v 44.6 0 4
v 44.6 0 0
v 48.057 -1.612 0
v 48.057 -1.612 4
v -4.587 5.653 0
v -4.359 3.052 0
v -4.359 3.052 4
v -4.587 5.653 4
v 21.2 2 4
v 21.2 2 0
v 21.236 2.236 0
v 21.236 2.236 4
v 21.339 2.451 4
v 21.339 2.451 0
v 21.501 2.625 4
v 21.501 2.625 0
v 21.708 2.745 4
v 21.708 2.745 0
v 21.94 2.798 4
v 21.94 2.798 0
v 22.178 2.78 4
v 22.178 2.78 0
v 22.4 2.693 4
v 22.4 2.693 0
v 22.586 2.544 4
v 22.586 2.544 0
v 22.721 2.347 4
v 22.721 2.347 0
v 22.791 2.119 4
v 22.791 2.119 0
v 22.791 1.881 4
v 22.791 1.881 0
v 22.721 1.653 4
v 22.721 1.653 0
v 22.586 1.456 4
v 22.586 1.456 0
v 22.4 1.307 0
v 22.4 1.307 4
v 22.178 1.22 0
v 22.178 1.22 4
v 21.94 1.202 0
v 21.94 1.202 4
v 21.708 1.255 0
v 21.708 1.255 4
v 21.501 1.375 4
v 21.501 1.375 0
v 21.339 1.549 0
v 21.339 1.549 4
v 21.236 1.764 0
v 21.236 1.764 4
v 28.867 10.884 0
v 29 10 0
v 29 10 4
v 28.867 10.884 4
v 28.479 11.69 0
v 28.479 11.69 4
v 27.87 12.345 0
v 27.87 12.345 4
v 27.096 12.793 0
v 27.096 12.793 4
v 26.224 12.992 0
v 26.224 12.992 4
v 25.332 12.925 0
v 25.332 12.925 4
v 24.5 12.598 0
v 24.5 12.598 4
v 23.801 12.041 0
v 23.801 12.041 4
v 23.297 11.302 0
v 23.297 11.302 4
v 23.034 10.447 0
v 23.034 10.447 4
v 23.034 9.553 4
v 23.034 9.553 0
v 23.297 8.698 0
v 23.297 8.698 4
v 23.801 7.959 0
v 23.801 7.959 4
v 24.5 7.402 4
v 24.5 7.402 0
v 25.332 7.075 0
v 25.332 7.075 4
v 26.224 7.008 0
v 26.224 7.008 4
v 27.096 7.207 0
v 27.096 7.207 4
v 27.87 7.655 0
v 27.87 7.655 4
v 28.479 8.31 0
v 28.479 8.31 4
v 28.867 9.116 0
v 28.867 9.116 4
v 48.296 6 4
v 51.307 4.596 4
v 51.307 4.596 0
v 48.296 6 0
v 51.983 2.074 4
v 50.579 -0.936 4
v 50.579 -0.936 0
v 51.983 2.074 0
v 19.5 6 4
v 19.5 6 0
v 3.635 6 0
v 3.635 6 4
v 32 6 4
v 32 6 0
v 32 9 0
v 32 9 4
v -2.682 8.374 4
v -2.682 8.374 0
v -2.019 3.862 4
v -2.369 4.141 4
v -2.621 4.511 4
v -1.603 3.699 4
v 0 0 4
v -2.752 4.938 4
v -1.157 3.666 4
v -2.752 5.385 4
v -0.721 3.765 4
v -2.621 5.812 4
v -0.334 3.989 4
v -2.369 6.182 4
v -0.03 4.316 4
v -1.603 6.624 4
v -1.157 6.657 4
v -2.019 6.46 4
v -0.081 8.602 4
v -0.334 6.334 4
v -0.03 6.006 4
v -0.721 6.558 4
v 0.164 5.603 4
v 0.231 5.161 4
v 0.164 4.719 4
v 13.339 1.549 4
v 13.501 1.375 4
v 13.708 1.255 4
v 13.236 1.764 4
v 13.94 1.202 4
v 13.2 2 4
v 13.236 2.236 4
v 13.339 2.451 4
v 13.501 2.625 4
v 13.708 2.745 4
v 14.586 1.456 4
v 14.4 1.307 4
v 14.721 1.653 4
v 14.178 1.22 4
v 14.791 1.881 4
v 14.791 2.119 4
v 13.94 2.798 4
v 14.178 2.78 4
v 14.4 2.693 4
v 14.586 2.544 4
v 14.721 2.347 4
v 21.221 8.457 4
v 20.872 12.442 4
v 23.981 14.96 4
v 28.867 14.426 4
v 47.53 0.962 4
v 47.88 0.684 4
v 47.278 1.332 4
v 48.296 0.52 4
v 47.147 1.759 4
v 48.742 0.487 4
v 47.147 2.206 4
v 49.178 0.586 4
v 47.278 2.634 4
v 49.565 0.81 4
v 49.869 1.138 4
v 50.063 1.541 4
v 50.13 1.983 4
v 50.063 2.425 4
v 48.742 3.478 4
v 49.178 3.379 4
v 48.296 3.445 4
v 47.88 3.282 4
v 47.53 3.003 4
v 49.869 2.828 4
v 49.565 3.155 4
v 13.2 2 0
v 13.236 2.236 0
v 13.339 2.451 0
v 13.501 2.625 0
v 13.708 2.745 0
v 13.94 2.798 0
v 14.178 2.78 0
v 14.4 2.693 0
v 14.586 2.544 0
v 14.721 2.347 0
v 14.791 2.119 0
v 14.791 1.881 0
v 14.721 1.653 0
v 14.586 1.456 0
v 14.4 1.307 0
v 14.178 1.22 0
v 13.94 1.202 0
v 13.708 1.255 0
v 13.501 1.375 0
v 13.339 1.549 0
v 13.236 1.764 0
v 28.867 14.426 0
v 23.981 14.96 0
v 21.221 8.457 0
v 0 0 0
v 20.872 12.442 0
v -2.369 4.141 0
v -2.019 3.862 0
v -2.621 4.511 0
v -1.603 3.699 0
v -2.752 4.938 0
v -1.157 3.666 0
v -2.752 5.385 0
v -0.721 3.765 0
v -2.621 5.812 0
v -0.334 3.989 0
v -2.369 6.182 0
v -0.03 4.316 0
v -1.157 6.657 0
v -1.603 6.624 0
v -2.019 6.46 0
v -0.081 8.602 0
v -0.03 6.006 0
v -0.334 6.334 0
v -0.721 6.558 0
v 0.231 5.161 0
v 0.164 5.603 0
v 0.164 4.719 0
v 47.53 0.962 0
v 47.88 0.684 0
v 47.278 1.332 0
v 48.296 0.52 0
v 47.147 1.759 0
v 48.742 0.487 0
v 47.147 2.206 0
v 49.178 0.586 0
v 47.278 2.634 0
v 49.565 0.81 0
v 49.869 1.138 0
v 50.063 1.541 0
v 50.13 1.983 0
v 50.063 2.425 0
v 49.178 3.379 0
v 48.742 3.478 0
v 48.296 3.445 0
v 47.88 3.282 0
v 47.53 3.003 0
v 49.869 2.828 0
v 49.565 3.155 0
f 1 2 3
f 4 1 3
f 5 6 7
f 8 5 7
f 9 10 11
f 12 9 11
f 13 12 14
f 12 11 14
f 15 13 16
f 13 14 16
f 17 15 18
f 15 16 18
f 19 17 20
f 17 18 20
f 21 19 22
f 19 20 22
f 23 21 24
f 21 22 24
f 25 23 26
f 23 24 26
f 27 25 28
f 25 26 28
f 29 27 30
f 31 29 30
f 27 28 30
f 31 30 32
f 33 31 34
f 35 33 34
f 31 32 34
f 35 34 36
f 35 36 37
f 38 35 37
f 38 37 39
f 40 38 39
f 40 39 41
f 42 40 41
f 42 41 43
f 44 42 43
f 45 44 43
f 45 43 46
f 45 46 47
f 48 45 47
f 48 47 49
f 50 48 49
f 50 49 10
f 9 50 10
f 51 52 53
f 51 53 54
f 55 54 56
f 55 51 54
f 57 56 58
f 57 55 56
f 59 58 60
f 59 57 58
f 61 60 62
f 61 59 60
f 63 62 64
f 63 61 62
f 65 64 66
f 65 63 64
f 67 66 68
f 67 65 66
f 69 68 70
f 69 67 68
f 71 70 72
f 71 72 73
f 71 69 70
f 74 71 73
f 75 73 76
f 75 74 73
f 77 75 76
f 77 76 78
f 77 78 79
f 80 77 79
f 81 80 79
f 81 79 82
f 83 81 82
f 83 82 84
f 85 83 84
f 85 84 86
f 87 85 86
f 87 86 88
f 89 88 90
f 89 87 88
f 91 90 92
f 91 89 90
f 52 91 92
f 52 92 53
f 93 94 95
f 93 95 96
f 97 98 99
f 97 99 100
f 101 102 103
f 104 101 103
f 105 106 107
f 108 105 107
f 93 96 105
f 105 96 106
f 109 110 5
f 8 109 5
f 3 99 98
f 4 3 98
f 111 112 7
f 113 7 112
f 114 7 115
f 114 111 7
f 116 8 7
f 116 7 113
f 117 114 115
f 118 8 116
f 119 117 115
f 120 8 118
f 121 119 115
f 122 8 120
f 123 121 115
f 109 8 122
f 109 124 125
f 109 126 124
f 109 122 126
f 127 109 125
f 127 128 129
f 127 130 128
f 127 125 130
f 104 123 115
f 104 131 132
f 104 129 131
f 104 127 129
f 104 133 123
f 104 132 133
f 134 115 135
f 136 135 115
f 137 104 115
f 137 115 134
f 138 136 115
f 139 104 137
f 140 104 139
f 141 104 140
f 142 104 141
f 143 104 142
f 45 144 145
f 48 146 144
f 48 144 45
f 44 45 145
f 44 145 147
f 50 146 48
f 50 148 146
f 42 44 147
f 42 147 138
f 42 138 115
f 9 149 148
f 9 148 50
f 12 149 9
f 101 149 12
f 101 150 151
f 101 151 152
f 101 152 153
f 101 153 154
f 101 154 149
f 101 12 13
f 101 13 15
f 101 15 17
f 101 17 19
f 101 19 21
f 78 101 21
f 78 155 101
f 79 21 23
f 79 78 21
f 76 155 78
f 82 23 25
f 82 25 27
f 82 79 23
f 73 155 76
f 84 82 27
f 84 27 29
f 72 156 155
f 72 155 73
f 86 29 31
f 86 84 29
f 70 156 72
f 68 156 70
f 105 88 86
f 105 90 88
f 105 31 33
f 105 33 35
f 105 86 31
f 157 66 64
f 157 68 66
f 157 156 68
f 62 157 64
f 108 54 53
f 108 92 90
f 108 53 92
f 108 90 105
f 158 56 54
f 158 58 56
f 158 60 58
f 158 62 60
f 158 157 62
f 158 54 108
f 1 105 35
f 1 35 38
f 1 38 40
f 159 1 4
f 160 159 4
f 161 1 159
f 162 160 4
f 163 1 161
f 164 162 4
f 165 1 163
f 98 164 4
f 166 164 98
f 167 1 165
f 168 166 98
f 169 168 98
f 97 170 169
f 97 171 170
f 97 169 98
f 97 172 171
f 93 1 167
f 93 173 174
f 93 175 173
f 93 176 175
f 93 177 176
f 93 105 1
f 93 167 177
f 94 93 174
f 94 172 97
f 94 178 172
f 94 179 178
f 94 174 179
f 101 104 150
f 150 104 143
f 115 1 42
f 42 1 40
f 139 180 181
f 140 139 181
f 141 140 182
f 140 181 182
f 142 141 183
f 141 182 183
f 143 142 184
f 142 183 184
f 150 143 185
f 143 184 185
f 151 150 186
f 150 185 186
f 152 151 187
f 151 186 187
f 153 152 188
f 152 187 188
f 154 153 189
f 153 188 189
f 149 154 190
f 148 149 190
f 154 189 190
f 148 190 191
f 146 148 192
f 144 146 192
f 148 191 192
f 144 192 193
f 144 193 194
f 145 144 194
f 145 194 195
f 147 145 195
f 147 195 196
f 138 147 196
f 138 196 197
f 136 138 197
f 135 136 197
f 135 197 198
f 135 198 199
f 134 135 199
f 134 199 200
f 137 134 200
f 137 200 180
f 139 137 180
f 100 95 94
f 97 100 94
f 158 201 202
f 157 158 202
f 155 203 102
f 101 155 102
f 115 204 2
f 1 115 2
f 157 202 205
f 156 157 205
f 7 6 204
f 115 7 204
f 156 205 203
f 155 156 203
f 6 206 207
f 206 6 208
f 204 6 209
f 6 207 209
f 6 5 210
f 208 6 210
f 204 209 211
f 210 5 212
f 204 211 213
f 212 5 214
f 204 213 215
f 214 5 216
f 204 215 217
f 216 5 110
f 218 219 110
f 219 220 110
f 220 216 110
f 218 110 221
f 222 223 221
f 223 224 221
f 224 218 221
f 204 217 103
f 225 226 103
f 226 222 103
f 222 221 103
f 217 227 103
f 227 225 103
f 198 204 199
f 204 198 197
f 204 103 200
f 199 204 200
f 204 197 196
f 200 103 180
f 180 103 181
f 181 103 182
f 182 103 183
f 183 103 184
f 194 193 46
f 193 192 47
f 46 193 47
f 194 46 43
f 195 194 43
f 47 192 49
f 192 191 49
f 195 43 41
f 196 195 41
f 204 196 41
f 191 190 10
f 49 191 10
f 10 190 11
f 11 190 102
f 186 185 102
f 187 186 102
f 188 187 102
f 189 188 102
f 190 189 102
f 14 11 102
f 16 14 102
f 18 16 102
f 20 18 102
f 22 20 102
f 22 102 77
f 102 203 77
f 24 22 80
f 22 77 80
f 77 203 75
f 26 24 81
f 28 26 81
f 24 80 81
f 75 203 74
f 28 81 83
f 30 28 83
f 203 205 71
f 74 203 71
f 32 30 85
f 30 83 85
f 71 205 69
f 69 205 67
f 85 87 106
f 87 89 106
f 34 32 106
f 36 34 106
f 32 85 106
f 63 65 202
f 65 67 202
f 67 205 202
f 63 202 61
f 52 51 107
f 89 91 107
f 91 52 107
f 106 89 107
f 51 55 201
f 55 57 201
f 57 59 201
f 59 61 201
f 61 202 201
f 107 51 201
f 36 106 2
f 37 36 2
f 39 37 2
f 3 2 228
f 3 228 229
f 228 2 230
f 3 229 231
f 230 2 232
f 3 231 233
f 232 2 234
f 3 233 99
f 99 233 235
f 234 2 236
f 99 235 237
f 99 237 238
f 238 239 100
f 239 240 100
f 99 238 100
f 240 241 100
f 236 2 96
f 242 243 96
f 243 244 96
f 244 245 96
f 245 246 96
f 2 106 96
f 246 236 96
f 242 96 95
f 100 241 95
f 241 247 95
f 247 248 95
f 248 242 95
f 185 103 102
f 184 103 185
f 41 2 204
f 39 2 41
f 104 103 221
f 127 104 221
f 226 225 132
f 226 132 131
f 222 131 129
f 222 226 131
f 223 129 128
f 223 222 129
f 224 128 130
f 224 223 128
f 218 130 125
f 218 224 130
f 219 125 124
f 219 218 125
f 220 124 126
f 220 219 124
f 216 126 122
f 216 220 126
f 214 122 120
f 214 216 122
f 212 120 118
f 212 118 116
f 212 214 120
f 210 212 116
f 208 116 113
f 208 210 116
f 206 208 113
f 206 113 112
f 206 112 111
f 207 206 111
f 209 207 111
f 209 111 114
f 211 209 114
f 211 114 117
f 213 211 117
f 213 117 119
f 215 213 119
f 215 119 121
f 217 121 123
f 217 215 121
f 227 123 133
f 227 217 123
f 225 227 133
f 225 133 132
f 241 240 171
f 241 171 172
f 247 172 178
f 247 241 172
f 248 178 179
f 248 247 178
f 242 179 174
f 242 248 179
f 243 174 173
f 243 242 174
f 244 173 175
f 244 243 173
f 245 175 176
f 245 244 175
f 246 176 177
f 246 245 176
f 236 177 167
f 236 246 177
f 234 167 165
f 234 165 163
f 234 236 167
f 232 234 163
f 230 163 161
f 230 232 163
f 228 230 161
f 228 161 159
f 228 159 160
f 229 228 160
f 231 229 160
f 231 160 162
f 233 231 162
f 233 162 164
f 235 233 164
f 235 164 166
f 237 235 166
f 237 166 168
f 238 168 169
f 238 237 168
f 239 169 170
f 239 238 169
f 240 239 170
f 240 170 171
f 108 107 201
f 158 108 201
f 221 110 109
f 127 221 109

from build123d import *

# Parameters (mm, degrees)
SKETCH_1_R             = 3
SKETCH_1_R_2           = 1.5
EXTRUDE_1_DEPTH        = 4
HOLE_WIZARD_M2_1_D     = 1.6
HOLE_WIZARD_M2_1_DEPTH = 14
HOLE_WIZARD_M2_1_TIP   = 0.480688495
CHAMFER_1_SIZE         = 2
CHAMFER_1_SIZE2        = 1.678199262
CHAMFER_1_PART_2_SIZE  = 2
CHAMFER_1_PART_2_SIZE2 = 1.678199262
CHAMFER_1_PART_3_SIZE  = 2
CHAMFER_1_PART_3_SIZE2 = 1.678199262
CHAMFER_1_PART_4_SIZE  = 2
CHAMFER_1_PART_4_SIZE2 = 1.678199262


with BuildPart() as part:
    # 草图1 → 凸台-拉伸1 (new body)
    with BuildSketch(Plane.XY):
        Polygon((0, 0), (44.599947574, 0), (49.869528236, -2.457245818), (52.827856068, 3.886908691), (48.296317133, 6), (32, 6), (32, 9), (28.867245682, 14.426089647), (23.980690184, 14.959516489), (20.872106338, 12.442234925), (21.220729309, 8.457456133), (19.5, 6), (3.635239529, 6), (-1.719029256, 9.749099364), (-5.73406431, 4.015035054), align=None)
        with Locations((26, 10)):
            Circle(SKETCH_1_R, mode=Mode.SUBTRACT)
        with Locations((-1.26909065, 5.1613379)):
            Circle(SKETCH_1_R_2, mode=Mode.SUBTRACT)
        with Locations((48.629768791, 1.982686222)):
            Circle(SKETCH_1_R_2, mode=Mode.SUBTRACT)
    extrude(amount=EXTRUDE_1_DEPTH)

    # M2 螺纹孔1
    with Locations(Plane.XY.offset(4)):
        with Locations((14, 2), (22, 2)):
            Hole(HOLE_WIZARD_M2_1_D / 2, depth=HOLE_WIZARD_M2_1_DEPTH)
            with Locations((0, 0, -(HOLE_WIZARD_M2_1_DEPTH + HOLE_WIZARD_M2_1_TIP / 2))):  # 118° drill point
                Cone(0, HOLE_WIZARD_M2_1_D / 2, HOLE_WIZARD_M2_1_TIP, mode=Mode.SUBTRACT)

    # 倒角1
    chamfer_1_edges = [part.edges().sort_by_distance(p)[0] for p in [
        (-5.73406431, 4.015035054, 2),
    ]]
    chamfer_1_side = [part.faces().sort_by_distance(p)[0] for p in [
        (-3.726546783, 6.882067209, 2),
    ]]
    chamfer(chamfer_1_edges, length=CHAMFER_1_SIZE, length2=CHAMFER_1_SIZE2, reference=chamfer_1_side[0])

    # 倒角1 part 2
    chamfer_1_part_2_edges = [part.edges().sort_by_distance(p)[0] for p in [
        (-1.719029256, 9.749099364, 2),
    ]]
    chamfer_1_part_2_side = [part.faces().sort_by_distance(p)[0] for p in [
        (0.958105137, 7.874549682, 2),
    ]]
    chamfer(chamfer_1_part_2_edges, length=CHAMFER_1_PART_2_SIZE, length2=CHAMFER_1_PART_2_SIZE2, reference=chamfer_1_part_2_side[0])

    # 倒角1 part 3
    chamfer_1_part_3_edges = [part.edges().sort_by_distance(p)[0] for p in [
        (52.827856068, 3.886908691, 2),
    ]]
    chamfer_1_part_3_side = [part.faces().sort_by_distance(p)[0] for p in [
        (51.348692152, 0.714831437, 2),
    ]]
    chamfer(chamfer_1_part_3_edges, length=CHAMFER_1_PART_3_SIZE, length2=CHAMFER_1_PART_3_SIZE2, reference=chamfer_1_part_3_side[0])

    # 倒角1 part 4
    chamfer_1_part_4_edges = [part.edges().sort_by_distance(p)[0] for p in [
        (49.869528236, -2.457245818, 2),
    ]]
    chamfer_1_part_4_side = [part.faces().sort_by_distance(p)[0] for p in [
        (47.234737905, -1.228622909, 2),
    ]]
    chamfer(chamfer_1_part_4_edges, length=CHAMFER_1_PART_4_SIZE, length2=CHAMFER_1_PART_4_SIZE2, reference=chamfer_1_part_4_side[0])


solid = part.part
